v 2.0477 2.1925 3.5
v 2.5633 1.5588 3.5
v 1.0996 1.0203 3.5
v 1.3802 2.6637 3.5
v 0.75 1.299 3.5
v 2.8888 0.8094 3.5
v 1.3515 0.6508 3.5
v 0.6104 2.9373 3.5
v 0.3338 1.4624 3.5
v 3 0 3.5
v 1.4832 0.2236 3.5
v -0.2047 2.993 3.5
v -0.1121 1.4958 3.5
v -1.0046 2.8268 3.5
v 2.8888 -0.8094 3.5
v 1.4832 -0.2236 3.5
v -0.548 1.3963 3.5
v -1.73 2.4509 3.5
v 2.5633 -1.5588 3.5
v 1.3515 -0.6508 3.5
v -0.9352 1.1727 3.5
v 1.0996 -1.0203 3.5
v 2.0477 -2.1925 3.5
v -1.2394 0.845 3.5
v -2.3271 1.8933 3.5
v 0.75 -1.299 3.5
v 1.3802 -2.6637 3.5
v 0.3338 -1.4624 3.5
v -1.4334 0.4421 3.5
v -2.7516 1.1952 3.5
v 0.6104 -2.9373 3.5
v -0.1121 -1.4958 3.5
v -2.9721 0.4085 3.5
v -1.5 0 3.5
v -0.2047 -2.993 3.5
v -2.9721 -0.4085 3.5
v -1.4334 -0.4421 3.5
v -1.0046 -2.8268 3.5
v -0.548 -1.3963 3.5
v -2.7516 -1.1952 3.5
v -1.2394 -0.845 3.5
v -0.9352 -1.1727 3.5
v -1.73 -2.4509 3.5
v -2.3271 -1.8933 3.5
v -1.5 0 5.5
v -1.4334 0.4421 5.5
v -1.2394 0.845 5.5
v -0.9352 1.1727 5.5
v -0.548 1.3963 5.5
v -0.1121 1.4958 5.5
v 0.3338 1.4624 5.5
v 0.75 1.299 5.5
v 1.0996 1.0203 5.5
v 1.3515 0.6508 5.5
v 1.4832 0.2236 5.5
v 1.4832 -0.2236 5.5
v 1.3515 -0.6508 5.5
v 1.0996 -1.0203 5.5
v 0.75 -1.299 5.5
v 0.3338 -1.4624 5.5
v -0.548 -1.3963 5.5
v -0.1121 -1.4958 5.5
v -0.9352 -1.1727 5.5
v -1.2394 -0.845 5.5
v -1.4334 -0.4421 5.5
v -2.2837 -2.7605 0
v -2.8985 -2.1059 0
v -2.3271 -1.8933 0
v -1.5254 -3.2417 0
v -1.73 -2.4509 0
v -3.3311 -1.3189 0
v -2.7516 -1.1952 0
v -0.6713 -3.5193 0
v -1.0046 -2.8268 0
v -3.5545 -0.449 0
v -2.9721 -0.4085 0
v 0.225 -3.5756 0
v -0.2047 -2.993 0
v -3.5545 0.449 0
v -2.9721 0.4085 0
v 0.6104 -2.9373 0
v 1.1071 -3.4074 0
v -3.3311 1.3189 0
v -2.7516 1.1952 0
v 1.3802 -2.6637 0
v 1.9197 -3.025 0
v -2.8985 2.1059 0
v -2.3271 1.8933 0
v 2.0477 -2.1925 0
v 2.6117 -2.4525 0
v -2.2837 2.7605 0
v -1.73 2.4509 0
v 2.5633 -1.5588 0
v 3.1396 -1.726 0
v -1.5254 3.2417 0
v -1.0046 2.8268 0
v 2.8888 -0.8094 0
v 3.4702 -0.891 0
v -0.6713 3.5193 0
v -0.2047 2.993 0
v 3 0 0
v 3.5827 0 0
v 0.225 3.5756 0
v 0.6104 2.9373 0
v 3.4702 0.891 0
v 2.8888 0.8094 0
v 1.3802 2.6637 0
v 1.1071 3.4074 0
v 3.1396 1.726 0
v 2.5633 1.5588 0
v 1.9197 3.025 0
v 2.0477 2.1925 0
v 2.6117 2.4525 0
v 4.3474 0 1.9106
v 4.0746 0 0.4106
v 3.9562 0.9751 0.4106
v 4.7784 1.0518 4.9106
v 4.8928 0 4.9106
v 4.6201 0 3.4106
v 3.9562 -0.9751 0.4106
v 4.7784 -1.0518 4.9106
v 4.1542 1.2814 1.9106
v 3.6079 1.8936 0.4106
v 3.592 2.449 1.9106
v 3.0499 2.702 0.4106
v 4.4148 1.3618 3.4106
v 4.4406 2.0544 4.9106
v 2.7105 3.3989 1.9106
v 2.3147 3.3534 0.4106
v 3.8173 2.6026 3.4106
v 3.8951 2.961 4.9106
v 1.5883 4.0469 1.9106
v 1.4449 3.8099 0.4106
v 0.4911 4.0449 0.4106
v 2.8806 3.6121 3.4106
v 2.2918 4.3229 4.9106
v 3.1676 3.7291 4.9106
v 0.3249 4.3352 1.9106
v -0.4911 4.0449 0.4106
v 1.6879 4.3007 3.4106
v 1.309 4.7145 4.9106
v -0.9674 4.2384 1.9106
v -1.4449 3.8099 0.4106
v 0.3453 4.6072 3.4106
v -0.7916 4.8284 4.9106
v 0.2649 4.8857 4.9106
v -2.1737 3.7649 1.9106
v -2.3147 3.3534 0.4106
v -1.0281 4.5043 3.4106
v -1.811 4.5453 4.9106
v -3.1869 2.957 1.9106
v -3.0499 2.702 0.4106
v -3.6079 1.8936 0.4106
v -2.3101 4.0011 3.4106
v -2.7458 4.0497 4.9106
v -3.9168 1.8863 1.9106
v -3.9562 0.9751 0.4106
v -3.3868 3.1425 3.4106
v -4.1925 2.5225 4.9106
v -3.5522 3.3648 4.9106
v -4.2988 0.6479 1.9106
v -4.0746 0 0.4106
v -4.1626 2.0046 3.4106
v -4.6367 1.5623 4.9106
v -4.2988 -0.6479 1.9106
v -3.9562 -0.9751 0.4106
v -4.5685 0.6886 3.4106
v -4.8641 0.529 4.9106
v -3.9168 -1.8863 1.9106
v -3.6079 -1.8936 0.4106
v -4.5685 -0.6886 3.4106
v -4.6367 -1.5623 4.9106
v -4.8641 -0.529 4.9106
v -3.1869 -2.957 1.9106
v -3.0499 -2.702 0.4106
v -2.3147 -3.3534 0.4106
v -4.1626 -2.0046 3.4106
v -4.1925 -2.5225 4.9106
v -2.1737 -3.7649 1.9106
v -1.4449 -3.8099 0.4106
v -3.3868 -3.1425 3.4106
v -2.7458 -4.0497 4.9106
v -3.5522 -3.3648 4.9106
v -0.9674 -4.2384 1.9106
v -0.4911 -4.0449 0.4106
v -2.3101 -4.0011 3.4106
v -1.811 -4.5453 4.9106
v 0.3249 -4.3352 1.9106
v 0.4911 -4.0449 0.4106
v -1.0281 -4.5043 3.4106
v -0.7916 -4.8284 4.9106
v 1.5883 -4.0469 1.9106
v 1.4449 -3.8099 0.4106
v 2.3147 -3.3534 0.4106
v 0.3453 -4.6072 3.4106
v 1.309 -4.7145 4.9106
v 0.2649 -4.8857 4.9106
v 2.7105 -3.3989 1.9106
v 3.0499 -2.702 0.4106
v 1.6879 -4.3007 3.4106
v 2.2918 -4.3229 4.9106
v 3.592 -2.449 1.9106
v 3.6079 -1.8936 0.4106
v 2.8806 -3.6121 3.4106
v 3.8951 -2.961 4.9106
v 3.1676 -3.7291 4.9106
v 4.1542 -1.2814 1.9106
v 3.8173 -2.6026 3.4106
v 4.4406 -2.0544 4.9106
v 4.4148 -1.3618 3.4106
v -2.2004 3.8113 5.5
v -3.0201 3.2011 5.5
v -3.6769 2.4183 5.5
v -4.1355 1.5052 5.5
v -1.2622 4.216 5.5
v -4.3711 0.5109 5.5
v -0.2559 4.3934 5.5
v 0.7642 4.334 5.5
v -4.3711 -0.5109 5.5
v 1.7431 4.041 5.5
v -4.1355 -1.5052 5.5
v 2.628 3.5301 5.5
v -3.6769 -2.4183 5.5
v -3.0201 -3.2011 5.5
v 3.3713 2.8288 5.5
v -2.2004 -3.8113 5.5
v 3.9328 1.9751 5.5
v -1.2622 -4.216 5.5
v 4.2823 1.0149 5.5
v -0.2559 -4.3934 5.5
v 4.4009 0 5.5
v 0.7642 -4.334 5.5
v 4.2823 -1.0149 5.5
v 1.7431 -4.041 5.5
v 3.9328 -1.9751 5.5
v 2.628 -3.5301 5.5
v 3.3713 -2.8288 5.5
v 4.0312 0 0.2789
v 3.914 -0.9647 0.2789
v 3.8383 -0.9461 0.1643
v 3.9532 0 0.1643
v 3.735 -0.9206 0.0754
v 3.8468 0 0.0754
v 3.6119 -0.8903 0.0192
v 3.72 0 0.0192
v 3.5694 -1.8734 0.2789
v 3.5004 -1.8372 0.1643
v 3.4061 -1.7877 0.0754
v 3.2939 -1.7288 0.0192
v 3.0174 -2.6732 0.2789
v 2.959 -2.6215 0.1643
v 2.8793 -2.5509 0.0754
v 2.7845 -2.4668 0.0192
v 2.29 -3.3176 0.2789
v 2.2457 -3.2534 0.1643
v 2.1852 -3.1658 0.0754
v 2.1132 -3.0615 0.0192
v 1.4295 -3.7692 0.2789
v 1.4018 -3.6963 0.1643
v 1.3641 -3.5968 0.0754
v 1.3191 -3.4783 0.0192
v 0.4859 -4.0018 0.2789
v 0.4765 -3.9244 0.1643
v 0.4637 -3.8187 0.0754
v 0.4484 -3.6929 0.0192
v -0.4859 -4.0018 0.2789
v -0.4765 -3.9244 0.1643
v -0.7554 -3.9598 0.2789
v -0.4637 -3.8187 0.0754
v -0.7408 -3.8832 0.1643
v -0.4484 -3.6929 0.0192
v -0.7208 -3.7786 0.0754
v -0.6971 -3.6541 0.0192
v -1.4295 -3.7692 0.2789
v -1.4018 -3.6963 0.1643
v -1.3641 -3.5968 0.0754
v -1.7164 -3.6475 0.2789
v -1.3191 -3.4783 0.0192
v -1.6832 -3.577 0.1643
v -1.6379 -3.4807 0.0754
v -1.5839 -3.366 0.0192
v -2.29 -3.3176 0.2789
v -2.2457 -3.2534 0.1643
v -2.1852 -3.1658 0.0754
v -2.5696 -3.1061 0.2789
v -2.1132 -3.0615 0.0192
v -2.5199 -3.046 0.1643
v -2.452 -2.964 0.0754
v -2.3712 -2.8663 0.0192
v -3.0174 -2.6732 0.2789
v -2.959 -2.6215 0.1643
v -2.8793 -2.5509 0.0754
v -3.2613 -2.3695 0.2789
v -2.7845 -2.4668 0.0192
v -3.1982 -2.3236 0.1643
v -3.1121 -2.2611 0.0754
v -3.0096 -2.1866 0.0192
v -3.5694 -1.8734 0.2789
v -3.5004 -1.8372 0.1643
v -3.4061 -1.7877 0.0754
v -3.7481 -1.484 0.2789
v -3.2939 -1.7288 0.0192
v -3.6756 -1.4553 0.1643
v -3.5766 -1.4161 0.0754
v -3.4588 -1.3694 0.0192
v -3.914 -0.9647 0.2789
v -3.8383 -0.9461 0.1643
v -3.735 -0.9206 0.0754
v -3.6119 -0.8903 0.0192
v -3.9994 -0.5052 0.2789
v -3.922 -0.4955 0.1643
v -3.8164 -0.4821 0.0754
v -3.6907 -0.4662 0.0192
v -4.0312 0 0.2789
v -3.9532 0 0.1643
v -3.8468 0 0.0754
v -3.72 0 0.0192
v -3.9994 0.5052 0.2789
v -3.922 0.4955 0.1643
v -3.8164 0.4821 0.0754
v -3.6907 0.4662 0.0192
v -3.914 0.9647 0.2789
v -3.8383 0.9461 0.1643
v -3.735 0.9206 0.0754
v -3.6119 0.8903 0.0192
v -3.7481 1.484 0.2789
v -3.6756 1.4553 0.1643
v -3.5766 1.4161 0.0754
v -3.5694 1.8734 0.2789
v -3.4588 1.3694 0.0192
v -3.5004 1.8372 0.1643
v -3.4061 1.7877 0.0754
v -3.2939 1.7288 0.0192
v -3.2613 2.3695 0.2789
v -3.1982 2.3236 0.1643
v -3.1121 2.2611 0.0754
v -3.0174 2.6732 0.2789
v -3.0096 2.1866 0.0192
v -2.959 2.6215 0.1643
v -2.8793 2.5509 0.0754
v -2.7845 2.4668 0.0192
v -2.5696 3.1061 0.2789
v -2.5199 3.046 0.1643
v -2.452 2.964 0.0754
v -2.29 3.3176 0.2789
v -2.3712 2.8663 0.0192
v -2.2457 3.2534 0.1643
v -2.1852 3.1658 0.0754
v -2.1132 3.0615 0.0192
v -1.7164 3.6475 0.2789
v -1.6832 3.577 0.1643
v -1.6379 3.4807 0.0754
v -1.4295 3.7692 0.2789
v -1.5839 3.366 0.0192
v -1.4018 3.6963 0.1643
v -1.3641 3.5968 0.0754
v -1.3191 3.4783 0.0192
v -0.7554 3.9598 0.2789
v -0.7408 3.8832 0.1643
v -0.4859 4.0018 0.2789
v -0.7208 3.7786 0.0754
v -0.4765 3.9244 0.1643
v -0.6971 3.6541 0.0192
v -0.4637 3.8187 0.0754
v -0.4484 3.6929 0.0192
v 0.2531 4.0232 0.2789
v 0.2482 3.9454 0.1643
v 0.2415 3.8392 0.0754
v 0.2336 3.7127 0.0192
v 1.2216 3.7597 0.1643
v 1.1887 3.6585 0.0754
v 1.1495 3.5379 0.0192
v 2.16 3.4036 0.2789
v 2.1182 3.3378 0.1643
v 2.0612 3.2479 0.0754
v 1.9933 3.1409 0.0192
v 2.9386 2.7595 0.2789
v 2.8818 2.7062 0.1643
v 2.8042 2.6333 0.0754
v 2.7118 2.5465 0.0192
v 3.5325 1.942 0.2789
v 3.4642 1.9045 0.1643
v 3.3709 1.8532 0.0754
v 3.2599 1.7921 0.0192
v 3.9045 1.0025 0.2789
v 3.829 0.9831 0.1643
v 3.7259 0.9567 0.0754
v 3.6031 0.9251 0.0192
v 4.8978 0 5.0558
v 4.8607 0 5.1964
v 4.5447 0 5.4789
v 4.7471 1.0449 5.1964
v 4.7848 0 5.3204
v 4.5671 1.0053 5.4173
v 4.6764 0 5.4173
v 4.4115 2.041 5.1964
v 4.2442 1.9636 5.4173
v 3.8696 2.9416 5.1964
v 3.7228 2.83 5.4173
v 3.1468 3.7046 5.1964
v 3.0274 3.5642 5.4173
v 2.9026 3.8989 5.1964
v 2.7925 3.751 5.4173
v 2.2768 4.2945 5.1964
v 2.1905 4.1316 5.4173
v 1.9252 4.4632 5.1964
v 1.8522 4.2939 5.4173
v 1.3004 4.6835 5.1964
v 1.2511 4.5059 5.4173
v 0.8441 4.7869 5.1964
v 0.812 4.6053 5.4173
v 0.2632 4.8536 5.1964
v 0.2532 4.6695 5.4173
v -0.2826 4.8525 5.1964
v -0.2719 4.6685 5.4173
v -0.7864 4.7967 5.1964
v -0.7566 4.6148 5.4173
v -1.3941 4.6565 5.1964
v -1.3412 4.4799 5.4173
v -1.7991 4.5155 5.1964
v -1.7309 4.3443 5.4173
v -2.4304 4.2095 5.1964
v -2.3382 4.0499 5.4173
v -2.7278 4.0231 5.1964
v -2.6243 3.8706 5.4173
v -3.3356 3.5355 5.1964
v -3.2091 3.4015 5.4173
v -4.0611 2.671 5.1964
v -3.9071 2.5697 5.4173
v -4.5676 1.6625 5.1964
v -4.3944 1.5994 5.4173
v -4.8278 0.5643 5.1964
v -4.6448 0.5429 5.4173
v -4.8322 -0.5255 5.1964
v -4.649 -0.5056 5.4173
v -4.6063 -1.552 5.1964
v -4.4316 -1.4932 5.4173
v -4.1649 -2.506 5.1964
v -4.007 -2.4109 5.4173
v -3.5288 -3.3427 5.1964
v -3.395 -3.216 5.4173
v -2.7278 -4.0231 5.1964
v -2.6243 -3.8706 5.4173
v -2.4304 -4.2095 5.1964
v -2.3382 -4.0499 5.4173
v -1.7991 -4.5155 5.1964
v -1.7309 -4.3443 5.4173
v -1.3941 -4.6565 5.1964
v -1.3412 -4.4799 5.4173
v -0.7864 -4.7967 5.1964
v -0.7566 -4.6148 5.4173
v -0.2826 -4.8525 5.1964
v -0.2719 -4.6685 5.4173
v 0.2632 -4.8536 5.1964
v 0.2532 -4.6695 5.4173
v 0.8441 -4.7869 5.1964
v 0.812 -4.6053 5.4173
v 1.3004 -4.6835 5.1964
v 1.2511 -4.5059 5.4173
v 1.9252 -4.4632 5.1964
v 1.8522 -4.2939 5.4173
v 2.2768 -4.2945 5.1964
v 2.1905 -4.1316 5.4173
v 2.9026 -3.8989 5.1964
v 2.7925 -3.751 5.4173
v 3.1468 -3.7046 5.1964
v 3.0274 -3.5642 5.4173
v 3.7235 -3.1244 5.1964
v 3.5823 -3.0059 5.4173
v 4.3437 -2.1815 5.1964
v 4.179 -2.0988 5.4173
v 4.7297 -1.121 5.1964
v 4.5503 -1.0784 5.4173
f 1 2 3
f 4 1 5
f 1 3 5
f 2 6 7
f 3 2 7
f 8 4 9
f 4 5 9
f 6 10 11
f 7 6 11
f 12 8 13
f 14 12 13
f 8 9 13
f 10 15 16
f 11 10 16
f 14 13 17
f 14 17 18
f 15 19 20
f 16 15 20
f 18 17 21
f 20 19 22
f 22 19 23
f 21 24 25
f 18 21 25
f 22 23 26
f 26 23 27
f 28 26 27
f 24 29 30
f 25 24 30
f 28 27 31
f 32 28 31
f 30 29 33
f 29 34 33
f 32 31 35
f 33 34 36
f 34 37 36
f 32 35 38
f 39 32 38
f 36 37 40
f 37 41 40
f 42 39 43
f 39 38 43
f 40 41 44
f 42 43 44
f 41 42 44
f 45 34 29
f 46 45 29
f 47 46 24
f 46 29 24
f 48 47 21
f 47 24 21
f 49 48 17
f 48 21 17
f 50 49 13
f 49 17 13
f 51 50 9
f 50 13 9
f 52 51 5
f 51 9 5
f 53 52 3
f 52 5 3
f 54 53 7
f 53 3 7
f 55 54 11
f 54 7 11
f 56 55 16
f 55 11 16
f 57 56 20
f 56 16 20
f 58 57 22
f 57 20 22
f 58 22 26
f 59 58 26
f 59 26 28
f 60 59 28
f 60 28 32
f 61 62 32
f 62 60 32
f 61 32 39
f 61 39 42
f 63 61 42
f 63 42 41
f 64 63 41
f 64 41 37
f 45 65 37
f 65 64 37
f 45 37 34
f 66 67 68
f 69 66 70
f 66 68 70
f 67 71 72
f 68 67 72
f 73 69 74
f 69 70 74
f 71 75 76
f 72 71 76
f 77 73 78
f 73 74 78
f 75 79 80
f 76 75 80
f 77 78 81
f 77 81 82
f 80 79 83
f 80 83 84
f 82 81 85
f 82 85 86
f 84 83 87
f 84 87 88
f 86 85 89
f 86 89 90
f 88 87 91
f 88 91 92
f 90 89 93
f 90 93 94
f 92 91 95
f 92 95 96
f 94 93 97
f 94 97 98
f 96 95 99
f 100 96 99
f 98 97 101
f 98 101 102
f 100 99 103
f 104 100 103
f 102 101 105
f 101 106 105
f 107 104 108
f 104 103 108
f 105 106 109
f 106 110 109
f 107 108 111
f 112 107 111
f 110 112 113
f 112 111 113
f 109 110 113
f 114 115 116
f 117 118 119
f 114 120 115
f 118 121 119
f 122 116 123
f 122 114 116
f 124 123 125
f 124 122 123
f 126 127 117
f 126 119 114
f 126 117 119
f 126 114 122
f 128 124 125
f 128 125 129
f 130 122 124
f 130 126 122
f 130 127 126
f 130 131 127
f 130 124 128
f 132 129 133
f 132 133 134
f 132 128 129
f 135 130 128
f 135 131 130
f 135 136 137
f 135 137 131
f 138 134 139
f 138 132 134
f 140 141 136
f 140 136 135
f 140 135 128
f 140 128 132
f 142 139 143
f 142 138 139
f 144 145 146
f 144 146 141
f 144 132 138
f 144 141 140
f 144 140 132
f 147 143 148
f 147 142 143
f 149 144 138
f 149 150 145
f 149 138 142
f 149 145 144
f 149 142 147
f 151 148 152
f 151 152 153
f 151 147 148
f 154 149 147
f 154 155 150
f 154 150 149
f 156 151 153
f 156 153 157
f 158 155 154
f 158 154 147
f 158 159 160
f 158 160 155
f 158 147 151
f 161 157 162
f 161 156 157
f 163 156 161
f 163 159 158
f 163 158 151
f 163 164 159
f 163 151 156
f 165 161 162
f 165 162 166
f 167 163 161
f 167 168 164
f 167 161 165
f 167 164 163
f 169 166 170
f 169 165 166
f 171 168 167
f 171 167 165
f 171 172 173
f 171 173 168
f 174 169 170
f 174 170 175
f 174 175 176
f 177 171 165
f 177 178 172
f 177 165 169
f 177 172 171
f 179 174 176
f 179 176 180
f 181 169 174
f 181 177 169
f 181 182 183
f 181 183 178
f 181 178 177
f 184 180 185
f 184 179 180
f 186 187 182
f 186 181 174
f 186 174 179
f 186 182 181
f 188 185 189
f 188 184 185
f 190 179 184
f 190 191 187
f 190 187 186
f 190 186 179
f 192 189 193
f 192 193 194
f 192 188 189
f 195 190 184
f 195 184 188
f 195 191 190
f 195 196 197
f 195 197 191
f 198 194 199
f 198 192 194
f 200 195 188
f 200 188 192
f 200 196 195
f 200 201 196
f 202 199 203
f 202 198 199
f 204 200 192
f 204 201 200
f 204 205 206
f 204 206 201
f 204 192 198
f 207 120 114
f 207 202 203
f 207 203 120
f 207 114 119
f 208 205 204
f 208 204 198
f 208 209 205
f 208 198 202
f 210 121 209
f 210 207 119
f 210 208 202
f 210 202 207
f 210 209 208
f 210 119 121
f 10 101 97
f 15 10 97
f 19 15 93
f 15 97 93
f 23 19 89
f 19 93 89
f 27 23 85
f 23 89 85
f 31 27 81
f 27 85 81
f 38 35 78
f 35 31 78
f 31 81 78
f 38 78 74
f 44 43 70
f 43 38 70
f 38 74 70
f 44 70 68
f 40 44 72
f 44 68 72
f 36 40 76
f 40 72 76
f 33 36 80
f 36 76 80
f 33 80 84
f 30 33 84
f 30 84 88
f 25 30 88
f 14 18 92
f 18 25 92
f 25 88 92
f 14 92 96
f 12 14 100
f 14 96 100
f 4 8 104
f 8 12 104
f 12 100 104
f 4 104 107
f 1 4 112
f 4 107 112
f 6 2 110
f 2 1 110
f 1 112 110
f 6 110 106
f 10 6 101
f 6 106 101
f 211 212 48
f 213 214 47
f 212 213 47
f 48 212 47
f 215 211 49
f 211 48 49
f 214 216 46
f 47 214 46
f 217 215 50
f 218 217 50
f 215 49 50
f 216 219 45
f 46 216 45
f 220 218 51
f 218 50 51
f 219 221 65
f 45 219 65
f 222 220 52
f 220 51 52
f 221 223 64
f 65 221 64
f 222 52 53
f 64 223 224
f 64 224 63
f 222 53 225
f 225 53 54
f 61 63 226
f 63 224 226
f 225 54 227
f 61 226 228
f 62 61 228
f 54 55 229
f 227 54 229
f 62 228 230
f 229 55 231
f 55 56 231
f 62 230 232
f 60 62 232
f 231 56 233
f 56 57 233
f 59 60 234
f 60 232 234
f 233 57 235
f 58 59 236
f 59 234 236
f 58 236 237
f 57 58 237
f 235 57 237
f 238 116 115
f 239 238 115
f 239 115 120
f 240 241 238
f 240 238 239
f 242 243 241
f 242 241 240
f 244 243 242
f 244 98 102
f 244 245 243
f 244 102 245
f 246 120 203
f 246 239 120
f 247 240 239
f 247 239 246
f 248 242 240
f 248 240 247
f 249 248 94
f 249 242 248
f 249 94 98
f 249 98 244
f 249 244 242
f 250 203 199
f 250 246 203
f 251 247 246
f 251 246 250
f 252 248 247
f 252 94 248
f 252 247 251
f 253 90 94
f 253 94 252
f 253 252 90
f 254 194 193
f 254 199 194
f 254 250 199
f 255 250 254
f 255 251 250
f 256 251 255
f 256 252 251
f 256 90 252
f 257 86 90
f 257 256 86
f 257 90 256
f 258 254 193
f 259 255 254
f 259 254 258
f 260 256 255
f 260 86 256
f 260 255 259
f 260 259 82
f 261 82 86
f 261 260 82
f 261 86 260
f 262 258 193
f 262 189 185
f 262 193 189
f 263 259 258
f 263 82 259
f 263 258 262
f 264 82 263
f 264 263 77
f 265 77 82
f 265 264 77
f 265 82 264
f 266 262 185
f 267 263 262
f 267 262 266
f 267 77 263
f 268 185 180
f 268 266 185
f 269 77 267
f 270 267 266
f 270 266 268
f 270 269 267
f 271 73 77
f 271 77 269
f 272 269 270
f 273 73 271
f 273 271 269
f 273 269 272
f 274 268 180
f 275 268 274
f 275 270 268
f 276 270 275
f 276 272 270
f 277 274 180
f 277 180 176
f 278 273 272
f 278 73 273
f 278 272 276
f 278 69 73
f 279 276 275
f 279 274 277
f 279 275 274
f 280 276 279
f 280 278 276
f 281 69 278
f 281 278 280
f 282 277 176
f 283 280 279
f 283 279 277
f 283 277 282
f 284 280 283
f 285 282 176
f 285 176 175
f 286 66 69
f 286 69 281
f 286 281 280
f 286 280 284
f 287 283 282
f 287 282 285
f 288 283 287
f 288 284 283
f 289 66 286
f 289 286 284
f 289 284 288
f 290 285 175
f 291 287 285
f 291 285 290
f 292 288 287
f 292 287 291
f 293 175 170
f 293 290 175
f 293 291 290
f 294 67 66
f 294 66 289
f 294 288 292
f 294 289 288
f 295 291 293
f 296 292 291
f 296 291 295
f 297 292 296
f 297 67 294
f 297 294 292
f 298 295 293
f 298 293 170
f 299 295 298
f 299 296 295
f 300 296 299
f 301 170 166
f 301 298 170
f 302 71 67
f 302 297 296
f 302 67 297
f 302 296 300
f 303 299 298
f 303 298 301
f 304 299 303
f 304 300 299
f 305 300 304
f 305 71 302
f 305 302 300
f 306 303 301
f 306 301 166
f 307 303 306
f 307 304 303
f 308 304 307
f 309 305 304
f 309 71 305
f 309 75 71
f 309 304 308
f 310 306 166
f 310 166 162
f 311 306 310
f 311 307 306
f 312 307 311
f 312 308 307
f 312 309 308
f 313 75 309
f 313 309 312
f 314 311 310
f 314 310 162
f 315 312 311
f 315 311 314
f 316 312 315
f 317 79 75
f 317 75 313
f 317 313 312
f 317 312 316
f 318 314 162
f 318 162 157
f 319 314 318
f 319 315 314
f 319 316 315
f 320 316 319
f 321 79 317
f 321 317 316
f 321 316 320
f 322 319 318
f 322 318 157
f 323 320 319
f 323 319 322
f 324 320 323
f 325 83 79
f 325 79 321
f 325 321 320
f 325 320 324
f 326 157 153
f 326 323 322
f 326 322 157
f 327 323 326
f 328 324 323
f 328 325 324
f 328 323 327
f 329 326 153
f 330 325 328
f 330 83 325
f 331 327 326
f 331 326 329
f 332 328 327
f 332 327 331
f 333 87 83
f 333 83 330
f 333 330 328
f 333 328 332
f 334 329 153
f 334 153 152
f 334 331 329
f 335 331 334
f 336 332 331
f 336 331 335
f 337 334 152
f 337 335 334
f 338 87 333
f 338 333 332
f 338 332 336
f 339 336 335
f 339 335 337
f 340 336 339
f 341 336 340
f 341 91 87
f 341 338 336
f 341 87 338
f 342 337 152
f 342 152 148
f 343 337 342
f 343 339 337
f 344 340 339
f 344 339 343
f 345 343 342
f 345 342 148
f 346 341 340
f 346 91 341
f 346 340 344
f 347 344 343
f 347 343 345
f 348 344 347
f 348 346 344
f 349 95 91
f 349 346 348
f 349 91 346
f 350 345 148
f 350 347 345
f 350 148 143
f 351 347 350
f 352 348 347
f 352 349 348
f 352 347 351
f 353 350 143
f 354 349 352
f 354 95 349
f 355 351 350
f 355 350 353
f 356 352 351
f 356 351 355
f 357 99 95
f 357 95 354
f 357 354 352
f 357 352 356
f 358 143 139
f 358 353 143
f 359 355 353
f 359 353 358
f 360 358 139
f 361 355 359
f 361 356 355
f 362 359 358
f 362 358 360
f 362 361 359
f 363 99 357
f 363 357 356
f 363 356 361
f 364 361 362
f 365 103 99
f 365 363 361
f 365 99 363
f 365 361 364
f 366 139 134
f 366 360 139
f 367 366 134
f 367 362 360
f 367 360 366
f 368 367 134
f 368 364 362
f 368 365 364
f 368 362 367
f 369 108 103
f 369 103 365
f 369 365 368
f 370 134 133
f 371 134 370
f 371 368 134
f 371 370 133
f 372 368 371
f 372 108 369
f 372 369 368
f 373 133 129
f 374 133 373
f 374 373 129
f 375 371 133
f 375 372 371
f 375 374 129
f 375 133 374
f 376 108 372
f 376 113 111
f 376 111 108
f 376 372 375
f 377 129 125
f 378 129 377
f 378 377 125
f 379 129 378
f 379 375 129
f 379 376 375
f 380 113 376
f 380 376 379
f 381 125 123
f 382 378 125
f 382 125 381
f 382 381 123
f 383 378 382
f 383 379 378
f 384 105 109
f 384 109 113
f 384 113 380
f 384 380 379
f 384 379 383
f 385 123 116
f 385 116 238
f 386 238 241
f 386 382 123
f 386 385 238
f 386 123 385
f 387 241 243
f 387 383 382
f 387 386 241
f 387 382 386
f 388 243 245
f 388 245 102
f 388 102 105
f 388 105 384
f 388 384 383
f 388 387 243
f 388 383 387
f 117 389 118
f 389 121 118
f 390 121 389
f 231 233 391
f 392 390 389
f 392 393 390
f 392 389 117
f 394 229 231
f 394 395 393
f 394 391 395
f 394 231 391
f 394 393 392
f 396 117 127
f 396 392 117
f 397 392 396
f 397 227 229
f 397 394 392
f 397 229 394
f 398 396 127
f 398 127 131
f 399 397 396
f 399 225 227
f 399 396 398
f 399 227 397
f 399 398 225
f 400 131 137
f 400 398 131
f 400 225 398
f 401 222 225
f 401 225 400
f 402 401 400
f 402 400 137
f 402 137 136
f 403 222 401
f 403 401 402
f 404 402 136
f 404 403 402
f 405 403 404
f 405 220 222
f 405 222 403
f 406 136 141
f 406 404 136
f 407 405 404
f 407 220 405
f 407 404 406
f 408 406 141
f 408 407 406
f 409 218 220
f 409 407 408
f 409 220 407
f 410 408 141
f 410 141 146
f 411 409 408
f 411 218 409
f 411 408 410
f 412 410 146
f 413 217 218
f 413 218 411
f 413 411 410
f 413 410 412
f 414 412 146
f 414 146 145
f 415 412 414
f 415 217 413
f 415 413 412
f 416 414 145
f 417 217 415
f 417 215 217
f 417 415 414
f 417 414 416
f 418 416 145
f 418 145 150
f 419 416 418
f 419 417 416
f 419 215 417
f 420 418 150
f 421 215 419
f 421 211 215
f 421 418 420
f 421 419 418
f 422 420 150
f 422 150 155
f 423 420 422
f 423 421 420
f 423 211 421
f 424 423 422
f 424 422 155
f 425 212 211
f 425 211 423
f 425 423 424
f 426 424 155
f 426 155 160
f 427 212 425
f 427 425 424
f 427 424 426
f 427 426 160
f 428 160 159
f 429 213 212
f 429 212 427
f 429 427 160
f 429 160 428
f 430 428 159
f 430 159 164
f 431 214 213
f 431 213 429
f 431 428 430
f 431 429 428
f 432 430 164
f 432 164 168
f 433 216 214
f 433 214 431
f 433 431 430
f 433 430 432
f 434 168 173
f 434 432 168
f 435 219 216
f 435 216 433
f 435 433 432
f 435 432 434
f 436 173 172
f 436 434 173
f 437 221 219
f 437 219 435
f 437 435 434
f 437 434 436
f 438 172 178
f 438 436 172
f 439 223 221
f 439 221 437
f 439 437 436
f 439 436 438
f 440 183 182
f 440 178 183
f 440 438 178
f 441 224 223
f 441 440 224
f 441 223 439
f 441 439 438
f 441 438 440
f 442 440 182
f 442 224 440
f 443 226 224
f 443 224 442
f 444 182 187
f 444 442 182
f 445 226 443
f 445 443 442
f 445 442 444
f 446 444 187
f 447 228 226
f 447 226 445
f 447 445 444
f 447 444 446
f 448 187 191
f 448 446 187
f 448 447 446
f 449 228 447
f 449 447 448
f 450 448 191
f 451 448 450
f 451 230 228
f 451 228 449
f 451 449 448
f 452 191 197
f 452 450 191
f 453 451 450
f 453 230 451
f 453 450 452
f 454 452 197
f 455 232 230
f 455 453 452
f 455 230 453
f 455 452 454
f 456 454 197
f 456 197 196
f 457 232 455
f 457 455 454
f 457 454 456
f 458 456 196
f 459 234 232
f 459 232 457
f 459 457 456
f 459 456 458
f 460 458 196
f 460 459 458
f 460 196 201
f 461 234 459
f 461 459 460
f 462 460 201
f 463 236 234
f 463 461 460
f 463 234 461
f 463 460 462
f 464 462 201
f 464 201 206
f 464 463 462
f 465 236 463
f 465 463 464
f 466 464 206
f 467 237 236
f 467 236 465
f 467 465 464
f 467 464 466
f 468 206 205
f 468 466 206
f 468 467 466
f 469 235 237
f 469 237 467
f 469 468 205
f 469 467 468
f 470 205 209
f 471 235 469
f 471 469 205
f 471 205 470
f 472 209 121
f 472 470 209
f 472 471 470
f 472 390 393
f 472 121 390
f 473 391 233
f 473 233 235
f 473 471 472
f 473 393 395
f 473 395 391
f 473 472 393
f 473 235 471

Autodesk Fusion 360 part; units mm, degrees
sketch "Sketch1" plane through (0, 0, 0) normal (0, 0, 1) x (1, 0, 0) in component "Component"
  circle A0 centre (0, 0) radius 3
  circle A1 centre (0, 0) radius 4
  dimension "d1" = 6
  dimension "d2" = 8
extrude "Extrude1" add sketch "Sketch1" along normal blind 3.5 in component "Component"
sketch "Sketch2" plane through (0, 0, 3.5) normal (0, 0, 1) x (-1, 0, 0) in component "Component"
  circle A0 centre (0, 0) radius 3
  circle A1 centre (0, 0) radius 4
  circle A2 centre (0, 0) radius 1.5
  dimension "d5" = 3
extrude "Extrude2" add sketch "Sketch2" along normal blind 2 contours A0 | A1 in component "Component"
sketch "Sketch3" plane through (0, 0, 5.5) normal (0, 0, 1) x (-1, 0, 0) in component "Component"
  circle A0 centre (0, 0) radius 1.5
  circle A1 centre (0, 0) radius 4
sketch "Sketch4" plane through (0, 0, 5.5) normal (0, 0, 1) x (1, 0, 0) in component "Component"
  circle A0 centre (0, 0) radius 5
  dimension "d8" = 10
sketch "Sketch5" plane through (0, 0, 5.5) normal (0, 0, 1) x (1, 0, 0) in component "Component"
sketch "Sketch6" plane through (0, 0, 0) normal (0, 1, 0) x (1, 0, 0) in component "Component"
  line L0 (4, 0) -> (5, -5.5)
  line L1 (4, 0) -> (4, -5.5)
  line L2 (4, -5.5) -> (5, -5.5)
sketch "Sketch7" plane through (0, 0, 5.5) normal (0, 0, 1) x (1, 0, 0) in component "Component"
sketch "Sketch8" plane through (0, 0, 0) normal (0, 1, 0) x (1, 0, 0) in component "Component"
  line L0 (0, -5.5) -> (0, 0)
revolve "Revolve1" add sketch "Sketch6" angle 360 about axis through (0, 0, 5.5) along (0, 0, -1) in component "Component"
fillet "Fillet1" radius 0.5 1 edges at (-4.6616, -1.8081, 5.5) in component "Component"
fillet "Fillet2" radius 0.5 1 edges at (-3.7293, -1.4465, 0) in component "Component"
sketch "Sketch9" plane through (0, 0, 0) normal (0, 1, 0) x (1, 0, 0) in component "Component"
sketch "Sketch10" plane through (0, 0, 0) normal (0, 1, 0) x (1, 0, 0) in component "Component"
  line L0 (4, -2.75) -> (1, -2.75)
component "Component" placed x (1, 0, 0) y (0, 1, 0) z (0, 0, 1) at (0, 0, 0)
